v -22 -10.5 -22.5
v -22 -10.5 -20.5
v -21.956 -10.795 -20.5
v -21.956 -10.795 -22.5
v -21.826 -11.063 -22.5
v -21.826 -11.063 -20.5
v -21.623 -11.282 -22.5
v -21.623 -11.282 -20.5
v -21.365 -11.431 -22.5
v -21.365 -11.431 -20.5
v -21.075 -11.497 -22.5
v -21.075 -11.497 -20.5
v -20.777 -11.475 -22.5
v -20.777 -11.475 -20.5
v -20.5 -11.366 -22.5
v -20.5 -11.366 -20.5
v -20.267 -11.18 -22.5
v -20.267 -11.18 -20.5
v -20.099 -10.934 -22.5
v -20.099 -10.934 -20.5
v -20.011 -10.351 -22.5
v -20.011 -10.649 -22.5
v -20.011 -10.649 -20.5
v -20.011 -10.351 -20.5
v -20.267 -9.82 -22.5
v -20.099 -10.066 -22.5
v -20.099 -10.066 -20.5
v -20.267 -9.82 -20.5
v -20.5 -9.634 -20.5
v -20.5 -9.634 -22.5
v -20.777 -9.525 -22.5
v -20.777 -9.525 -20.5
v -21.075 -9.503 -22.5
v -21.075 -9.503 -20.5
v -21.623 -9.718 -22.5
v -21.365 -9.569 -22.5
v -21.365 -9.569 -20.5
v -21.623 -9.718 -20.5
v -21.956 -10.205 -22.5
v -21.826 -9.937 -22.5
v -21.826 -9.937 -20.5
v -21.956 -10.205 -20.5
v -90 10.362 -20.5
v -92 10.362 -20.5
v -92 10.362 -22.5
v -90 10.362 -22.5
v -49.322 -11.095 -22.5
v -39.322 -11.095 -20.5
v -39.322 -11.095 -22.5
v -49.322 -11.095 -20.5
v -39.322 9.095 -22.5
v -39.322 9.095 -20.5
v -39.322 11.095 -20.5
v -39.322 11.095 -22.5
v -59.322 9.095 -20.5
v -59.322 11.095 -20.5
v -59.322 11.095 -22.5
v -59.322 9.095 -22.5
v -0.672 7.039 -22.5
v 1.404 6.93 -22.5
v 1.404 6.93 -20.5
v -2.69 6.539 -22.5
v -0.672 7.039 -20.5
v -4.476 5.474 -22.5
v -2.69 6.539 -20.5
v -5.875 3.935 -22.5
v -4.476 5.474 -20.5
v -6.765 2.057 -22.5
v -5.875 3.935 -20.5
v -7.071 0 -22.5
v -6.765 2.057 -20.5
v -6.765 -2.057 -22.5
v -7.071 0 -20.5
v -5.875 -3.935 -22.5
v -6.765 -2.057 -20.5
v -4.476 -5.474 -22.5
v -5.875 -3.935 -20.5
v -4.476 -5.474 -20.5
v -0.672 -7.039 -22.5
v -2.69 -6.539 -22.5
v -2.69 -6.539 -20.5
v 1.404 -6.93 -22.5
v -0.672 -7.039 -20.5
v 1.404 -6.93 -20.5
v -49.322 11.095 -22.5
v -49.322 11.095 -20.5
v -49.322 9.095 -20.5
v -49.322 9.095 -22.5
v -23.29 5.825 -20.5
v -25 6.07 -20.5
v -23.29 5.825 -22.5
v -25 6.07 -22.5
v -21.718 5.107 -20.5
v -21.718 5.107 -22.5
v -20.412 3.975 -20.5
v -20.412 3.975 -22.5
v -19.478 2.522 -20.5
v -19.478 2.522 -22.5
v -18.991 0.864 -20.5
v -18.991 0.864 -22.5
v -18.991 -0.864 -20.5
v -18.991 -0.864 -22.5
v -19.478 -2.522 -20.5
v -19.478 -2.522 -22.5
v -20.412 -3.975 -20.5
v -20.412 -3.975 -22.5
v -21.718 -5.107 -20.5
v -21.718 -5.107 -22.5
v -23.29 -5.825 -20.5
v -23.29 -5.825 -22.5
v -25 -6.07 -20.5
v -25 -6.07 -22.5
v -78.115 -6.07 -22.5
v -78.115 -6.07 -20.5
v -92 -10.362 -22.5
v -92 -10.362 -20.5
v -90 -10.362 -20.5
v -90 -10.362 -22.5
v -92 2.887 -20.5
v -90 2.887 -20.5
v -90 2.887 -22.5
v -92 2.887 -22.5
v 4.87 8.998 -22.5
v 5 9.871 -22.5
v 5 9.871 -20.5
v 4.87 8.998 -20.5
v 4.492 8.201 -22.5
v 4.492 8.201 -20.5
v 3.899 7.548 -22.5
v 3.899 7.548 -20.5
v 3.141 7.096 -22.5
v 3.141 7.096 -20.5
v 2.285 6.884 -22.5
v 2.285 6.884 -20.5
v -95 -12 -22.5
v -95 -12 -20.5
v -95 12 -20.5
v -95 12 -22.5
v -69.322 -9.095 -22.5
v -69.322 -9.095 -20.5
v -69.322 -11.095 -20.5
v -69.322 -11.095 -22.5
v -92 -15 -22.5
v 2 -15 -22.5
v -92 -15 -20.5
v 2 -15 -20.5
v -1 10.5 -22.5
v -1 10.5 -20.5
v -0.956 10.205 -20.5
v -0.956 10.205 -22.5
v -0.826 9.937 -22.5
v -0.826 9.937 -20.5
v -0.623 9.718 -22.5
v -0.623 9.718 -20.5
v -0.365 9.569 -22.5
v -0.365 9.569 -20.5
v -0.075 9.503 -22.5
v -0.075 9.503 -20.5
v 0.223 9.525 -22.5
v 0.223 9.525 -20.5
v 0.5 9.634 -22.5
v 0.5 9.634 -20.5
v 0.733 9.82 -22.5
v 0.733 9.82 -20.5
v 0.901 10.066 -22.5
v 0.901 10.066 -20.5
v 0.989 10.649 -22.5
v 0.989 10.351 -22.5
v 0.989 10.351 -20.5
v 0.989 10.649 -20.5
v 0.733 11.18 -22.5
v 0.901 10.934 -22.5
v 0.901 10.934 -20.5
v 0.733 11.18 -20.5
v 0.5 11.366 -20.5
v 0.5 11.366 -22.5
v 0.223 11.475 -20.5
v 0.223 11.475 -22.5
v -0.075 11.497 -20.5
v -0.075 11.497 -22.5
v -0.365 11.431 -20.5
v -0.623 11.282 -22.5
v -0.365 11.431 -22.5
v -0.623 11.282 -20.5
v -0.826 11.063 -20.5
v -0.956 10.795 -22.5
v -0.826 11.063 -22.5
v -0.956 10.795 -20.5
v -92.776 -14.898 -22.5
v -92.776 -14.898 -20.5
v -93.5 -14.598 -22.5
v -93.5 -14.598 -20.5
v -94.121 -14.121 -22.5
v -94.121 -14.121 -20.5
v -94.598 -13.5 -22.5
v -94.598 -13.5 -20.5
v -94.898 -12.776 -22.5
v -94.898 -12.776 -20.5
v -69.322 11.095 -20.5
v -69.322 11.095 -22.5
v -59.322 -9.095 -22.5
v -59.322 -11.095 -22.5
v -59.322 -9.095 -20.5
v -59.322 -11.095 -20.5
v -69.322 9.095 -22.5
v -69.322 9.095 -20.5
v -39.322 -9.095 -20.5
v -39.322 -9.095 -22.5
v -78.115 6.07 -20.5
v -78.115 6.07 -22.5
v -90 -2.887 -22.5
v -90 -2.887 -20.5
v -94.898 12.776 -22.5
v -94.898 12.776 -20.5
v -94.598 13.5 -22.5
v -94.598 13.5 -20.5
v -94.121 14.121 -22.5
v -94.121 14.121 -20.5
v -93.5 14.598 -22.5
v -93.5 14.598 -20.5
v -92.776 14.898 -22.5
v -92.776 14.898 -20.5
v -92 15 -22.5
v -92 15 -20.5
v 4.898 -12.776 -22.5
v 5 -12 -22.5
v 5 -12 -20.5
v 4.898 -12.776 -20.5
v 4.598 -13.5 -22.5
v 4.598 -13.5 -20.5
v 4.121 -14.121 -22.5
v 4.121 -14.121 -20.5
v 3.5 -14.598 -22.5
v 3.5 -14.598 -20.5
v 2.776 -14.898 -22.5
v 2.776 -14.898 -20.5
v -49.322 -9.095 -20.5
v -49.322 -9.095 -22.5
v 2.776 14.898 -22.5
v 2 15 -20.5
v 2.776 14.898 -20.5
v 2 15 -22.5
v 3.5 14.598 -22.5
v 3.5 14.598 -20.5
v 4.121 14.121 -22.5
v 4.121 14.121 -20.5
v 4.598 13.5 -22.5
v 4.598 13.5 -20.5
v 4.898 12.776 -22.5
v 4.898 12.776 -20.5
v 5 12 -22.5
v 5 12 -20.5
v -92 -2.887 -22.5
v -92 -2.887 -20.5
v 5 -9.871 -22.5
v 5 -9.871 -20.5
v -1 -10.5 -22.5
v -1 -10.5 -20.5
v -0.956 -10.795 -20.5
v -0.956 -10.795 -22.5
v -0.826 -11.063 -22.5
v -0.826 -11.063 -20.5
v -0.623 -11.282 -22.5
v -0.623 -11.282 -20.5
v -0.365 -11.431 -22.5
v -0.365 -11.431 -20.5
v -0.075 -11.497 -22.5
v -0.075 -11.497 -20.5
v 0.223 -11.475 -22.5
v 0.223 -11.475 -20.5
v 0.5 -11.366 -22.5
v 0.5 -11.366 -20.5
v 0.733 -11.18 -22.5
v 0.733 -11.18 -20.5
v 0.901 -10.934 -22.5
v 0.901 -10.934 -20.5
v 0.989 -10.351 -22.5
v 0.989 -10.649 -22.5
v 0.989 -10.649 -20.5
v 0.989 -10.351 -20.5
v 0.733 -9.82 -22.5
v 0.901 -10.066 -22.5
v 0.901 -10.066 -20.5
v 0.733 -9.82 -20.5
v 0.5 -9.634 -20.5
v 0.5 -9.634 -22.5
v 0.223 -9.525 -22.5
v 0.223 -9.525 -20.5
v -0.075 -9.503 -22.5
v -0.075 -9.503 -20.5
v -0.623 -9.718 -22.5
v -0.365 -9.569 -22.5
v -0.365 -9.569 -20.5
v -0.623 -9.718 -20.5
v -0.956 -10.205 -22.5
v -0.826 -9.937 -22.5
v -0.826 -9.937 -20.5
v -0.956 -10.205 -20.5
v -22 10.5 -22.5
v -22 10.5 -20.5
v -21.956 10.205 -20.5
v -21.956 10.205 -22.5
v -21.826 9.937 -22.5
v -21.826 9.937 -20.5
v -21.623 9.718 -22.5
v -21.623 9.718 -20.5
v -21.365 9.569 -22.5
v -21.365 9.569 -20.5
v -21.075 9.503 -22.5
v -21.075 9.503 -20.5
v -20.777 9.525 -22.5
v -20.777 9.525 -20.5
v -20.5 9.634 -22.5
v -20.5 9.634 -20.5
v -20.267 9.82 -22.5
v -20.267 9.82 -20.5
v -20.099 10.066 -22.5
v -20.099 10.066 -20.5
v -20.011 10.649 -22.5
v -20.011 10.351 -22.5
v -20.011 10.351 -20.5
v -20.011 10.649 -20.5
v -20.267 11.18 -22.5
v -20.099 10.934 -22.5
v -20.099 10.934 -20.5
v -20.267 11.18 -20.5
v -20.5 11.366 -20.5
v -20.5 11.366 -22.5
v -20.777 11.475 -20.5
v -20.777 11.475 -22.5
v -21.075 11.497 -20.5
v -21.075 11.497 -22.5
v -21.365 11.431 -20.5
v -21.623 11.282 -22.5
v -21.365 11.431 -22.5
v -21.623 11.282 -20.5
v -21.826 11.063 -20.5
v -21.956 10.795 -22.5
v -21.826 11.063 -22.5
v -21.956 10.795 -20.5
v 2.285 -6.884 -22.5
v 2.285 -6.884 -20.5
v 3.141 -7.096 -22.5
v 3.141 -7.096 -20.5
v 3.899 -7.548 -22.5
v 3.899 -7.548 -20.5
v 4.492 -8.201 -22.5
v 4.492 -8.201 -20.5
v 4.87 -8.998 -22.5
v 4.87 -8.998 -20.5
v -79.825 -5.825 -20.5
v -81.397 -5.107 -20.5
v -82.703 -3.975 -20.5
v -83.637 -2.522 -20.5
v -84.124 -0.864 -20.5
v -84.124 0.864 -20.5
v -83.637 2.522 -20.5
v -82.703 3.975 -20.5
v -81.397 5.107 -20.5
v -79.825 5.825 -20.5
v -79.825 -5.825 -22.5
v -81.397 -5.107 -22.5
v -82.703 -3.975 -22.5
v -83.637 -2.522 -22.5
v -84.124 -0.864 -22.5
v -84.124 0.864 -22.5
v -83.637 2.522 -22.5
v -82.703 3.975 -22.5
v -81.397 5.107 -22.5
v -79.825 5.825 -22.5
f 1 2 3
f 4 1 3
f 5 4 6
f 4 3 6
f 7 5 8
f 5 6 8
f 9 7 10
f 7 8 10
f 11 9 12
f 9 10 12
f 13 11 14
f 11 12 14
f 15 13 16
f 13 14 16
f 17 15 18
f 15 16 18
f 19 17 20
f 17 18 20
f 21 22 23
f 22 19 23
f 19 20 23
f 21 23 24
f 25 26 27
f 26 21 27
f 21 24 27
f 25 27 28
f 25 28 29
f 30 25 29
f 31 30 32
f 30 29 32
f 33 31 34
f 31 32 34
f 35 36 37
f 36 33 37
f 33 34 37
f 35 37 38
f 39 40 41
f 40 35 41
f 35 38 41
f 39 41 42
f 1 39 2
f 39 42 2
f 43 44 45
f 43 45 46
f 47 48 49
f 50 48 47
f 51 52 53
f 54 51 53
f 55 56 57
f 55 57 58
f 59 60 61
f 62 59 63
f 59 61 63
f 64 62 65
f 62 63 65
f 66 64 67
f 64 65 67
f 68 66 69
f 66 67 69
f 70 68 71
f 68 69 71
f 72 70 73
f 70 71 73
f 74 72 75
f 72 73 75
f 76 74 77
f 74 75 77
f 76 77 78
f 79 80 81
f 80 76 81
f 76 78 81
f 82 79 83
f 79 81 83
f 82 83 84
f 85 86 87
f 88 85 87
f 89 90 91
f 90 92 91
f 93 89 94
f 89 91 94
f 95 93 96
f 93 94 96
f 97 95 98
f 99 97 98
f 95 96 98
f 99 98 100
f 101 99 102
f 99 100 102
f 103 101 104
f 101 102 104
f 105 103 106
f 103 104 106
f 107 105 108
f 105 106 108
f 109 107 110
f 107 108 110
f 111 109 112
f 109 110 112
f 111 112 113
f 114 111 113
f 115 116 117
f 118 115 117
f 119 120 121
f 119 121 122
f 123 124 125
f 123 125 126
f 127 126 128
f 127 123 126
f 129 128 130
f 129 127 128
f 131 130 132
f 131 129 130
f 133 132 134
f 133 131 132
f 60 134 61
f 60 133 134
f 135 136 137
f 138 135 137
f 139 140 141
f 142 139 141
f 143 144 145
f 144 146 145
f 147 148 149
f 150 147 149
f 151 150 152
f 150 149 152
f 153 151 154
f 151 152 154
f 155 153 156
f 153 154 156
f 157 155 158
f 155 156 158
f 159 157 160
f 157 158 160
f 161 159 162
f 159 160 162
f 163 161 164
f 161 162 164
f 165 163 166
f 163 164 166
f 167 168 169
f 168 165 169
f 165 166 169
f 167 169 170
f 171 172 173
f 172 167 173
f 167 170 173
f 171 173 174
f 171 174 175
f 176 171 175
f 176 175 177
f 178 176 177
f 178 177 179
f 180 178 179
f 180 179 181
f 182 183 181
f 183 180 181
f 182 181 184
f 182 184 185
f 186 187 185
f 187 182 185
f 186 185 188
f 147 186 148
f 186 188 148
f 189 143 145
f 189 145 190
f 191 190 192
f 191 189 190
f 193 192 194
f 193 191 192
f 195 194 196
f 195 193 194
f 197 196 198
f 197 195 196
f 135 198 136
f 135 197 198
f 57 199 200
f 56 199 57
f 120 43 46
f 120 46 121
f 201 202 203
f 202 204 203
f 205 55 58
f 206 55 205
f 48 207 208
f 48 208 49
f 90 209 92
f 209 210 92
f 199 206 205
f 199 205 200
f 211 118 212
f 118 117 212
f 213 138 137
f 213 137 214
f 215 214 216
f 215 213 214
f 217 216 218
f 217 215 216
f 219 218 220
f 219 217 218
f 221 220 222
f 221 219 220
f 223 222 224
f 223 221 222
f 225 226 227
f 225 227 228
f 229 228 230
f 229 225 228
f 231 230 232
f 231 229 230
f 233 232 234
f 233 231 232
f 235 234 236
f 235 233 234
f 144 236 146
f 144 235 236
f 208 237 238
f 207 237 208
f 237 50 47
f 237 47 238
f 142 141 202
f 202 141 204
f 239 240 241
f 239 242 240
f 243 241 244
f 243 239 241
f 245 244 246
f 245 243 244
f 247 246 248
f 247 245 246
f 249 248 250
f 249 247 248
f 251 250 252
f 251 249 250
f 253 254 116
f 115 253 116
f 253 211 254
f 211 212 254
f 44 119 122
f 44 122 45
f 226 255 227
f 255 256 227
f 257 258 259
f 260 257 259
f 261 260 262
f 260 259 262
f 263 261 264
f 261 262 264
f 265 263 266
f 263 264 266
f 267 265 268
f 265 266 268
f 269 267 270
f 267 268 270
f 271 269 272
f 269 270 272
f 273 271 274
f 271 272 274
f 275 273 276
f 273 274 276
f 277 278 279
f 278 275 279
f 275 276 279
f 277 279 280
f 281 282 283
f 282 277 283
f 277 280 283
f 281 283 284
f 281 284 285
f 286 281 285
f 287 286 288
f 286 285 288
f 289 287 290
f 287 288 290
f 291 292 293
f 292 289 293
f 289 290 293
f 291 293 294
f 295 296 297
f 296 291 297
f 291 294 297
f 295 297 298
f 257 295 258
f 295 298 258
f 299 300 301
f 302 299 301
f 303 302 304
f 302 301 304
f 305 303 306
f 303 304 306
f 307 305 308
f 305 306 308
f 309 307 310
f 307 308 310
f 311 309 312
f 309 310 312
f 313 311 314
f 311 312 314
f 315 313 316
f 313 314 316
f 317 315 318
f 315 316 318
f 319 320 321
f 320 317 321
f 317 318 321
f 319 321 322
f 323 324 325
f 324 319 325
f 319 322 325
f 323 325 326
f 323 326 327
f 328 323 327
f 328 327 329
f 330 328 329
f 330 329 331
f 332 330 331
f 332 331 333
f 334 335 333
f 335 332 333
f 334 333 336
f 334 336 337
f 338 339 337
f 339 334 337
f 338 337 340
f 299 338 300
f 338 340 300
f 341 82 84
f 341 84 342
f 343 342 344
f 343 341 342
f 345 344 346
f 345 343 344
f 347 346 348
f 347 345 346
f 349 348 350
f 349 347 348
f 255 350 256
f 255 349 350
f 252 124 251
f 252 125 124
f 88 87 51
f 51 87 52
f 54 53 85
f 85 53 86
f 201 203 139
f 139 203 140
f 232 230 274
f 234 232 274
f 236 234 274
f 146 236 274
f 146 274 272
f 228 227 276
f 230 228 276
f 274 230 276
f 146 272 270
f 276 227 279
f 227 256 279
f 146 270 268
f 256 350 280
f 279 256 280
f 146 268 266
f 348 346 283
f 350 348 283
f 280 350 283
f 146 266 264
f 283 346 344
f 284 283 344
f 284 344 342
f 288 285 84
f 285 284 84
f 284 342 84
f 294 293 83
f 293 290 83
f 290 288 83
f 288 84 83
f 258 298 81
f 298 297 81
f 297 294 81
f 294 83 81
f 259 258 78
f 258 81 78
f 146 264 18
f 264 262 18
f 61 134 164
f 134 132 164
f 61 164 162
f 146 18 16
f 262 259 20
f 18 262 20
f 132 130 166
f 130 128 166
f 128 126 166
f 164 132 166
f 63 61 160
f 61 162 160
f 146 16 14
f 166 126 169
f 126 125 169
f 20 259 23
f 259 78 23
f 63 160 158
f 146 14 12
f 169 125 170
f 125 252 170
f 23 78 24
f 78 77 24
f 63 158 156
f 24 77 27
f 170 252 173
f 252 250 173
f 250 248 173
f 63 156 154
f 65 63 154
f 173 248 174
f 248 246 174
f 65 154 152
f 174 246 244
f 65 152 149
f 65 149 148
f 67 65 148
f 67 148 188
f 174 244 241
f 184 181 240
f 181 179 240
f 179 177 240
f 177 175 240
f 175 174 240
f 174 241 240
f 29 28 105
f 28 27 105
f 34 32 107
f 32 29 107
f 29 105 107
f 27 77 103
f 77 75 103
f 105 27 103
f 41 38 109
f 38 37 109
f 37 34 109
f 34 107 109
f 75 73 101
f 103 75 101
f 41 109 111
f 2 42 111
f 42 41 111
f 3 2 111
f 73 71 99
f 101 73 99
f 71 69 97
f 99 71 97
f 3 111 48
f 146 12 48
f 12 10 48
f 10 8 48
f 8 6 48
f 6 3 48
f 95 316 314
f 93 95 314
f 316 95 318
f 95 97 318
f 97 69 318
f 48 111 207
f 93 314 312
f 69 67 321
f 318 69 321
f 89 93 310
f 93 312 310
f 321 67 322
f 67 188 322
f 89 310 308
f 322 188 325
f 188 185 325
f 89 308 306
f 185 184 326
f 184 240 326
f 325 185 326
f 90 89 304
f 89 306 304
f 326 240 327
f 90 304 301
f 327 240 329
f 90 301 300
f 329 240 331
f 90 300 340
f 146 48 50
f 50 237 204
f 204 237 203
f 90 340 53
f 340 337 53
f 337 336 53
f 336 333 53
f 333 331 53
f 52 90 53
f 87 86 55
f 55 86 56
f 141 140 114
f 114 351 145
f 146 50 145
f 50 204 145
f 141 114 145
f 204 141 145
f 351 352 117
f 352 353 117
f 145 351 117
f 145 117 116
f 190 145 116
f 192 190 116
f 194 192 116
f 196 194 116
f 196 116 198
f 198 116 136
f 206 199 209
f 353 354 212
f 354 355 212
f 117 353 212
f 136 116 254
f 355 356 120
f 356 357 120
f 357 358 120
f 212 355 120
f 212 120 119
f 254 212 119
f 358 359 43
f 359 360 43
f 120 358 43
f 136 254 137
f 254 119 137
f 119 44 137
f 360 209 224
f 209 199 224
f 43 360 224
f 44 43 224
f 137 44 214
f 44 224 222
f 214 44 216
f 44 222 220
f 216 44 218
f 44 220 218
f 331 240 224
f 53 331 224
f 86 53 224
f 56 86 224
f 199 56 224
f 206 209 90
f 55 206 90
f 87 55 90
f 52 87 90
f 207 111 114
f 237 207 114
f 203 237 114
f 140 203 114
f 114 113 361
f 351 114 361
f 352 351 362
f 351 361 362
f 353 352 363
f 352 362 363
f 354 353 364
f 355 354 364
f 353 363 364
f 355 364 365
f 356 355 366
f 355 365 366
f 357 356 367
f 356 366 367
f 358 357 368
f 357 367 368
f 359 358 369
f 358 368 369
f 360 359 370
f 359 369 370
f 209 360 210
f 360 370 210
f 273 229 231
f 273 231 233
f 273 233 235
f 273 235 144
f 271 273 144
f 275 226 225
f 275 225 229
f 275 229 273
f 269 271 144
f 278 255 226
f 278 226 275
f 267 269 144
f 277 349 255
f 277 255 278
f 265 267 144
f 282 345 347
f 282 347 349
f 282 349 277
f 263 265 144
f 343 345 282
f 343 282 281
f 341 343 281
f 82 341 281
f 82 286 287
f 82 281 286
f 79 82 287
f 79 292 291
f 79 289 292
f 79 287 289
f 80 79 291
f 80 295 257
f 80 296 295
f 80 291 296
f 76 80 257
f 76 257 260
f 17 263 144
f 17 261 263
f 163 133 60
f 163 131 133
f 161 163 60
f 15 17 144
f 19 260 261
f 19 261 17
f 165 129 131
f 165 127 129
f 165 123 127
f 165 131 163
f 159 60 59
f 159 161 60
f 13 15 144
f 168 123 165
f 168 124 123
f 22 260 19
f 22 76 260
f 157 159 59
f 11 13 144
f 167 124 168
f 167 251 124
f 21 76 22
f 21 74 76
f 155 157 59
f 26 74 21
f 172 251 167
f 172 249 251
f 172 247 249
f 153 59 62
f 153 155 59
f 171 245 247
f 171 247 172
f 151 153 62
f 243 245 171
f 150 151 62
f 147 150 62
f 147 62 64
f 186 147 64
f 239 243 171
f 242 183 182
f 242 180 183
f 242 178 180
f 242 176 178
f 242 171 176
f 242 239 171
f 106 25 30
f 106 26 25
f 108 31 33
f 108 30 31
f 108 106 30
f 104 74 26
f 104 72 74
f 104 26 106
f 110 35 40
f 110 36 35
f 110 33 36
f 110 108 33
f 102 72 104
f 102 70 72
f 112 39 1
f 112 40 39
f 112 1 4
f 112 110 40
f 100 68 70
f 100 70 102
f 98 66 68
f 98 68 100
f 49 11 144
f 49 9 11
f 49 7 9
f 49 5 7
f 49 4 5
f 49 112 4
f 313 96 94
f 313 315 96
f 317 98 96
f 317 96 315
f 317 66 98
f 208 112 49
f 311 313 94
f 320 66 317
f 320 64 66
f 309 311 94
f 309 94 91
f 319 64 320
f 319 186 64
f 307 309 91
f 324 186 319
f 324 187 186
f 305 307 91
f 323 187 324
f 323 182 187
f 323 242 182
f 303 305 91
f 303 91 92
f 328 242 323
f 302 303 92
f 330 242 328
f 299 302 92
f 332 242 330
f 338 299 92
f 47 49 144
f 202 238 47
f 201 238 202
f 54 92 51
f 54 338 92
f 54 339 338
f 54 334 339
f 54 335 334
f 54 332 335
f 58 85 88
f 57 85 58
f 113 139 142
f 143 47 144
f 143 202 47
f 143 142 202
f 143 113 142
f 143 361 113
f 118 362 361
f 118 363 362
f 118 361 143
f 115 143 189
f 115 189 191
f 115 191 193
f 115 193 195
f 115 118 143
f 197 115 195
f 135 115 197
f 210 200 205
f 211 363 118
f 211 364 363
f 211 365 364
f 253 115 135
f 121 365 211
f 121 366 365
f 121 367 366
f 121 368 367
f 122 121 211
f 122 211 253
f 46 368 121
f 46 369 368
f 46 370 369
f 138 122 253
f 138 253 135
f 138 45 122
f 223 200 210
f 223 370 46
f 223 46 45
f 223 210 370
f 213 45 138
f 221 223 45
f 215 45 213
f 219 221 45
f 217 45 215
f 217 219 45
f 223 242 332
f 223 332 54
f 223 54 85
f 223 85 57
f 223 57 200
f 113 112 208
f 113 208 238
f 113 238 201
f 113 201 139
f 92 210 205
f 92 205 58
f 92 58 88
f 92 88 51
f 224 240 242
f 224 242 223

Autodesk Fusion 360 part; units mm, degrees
sketch "Sketch1" plane through (0, 0, -20.5) normal (0, 0, -1) x (-1, 0, 0)
  line L0 (-5, 0) -> (-5, -15)
  line L1 (-5, -15) -> (95, -15)
  line L2 (95, -15) -> (95, 0)
  circle A0 centre (0, -10.5) radius 1
  circle A1 centre (21, -10.5) radius 1
  circle A2 centre (0, 0) radius 7.0711
  line L3 (92, -10.3624) -> (90, -10.3624)
  line L4 (90, -10.3624) -> (90, -2.8871)
  line L5 (90, -2.8871) -> (92, -2.8871)
  line L6 (92, -2.8871) -> (92, -10.3624)
  line L7 (100, 0) -> (42, 0) construction
  line L8 (-5, 15) -> (95, 15)
  line L9 (95, 15) -> (95, 0)
  line L10 (92, 10.3624) -> (90, 10.3624)
  line L11 (92, 2.8871) -> (92, 10.3624)
  line L12 (90, 10.3624) -> (90, 2.8871)
  line L13 (90, 2.8871) -> (92, 2.8871)
  circle A3 centre (21, 10.5) radius 1
  circle A4 centre (0, 10.5) radius 1
  line L14 (-5, 0) -> (-5, 15)
  line L15 (39.3215, 11.0949) -> (49.3215, 11.0949)
  line L16 (49.3215, 11.0949) -> (49.3215, 9.0949)
  line L17 (49.3215, 9.0949) -> (39.3215, 9.0949)
  line L18 (39.3215, 9.0949) -> (39.3215, 11.0949)
  line L19 (54.3215, 11.5) -> (54.3215, -12) construction
  line L20 (54.3215, -11.5) -> (54.3215, 12) construction
  line L21 (49.3215, -11.0949) -> (49.3215, -9.0949)
  line L22 (49.3215, -9.0949) -> (39.3215, -9.0949)
  line L23 (39.3215, -9.0949) -> (39.3215, -11.0949)
  line L24 (39.3215, -11.0949) -> (49.3215, -11.0949)
  line L25 (69.3215, 11.0949) -> (59.3215, 11.0949)
  line L26 (59.3215, 11.0949) -> (59.3215, 9.0949)
  line L27 (59.3215, 9.0949) -> (69.3215, 9.0949)
  line L28 (69.3215, 9.0949) -> (69.3215, 11.0949)
  line L29 (59.3215, -11.0949) -> (59.3215, -9.0949)
  line L30 (69.3215, -9.0949) -> (69.3215, -11.0949)
  line L31 (59.3215, -9.0949) -> (69.3215, -9.0949)
  line L32 (69.3215, -11.0949) -> (59.3215, -11.0949)
  dimension "d1" = 100
  dimension "d3" = 2
  dimension "d4" = 3
  dimension "d77" = 0
  dimension "d78" = 0
  dimension "d79" = 0
  dimension "d80" = 0
  dimension "d93" = 10
  dimension "d94" = 2
  dimension "d95" = 10
extrude "Extrude1" add sketch "Sketch1" along normal blind 2 contours L0 L1 L2 A2 L8 L9 L14
sketch "Sketch2" plane through (0, 0, -22.5) normal (0, 0, -1) x (-1, 0, 0)
  line L0 (25, -6.0704) -> (78.1149, -6.0704)
  arc A0 (78.1149, -6.0704) -> (78.1149, 6.0704) centre (78.1149, 0) ccw
  line L1 (78.1149, 6.0704) -> (25, 6.0704)
  arc A1 (25, 6.0704) -> (25, -6.0704) centre (25, 0) ccw
  line L2 (25, 0) -> (78.1149, 0) construction
extrude "Extrude2" cut sketch "Sketch2" against normal blind 2
fillet "Fillet1" radius 3 6 edges at (5, 15, -21.5) (5, 5, -21.5) (5, -5, -21.5) (5, -15, -21.5) (-95, 15, -21.5) (-95, -15, -21.5)
sketch "Sketch3" plane through (0, 0, -20.5) normal (0, 0, 1) x (1, 0, 0)
sketch "Projection" plane through (0, 0, -20.5) normal (0, 0, 1) x (1, 0, 0)
  line L0 (-25, -6.0704) -> (-78.1149, -6.0704)
  arc A0 (-78.1149, 6.0704) -> (-78.1149, -6.0704) centre (-78.1149, 0) ccw
  line L1 (-78.1149, 6.0704) -> (-25, 6.0704)
  arc A1 (-25, -6.0704) -> (-25, 6.0704) centre (-25, 0) ccw
  line L2 (-92, -2.8871) -> (-90, -2.8871)
  line L3 (-90, -2.8871) -> (-90, -10.3624)
  line L4 (-90, -10.3624) -> (-92, -10.3624)
  line L5 (-92, -10.3624) -> (-92, -2.8871)
  line L6 (-39.3215, -11.0949) -> (-49.3215, -11.0949)
  line L7 (-49.3215, -11.0949) -> (-49.3215, -9.0949)
  line L8 (-49.3215, -9.0949) -> (-39.3215, -9.0949)
  line L9 (-39.3215, -9.0949) -> (-39.3215, -11.0949)
  line L10 (-69.3215, 9.0949) -> (-69.3215, 11.0949)
  line L11 (-69.3215, 11.0949) -> (-59.3215, 11.0949)
  line L12 (-59.3215, 11.0949) -> (-59.3215, 9.0949)
  line L13 (-59.3215, 9.0949) -> (-69.3215, 9.0949)
  circle A2 centre (-21, -10.5) radius 1
  circle A3 centre (-21, 10.5) radius 1
  line L14 (-69.3215, -11.0949) -> (-69.3215, -9.0949)
  line L15 (-69.3215, -9.0949) -> (-59.3215, -9.0949)
  line L16 (-59.3215, -9.0949) -> (-59.3215, -11.0949)
  line L17 (-59.3215, -11.0949) -> (-69.3215, -11.0949)
  line L18 (-90, 2.8871) -> (-92, 2.8871)
  line L19 (-92, 2.8871) -> (-92, 10.3624)
  line L20 (-92, 10.3624) -> (-90, 10.3624)
  line L21 (-90, 10.3624) -> (-90, 2.8871)
  circle A4 centre (0, 10.5) radius 1
  line L22 (-39.3215, 9.0949) -> (-49.3215, 9.0949)
  line L23 (-49.3215, 9.0949) -> (-49.3215, 11.0949)
  line L24 (-49.3215, 11.0949) -> (-39.3215, 11.0949)
  line L25 (-39.3215, 11.0949) -> (-39.3215, 9.0949)
  circle A5 centre (0, -10.5) radius 1
  arc A6 (-95, -12) -> (-92, -15) centre (-92, -12) ccw
  line L26 (-92, -15) -> (2, -15)
  arc A7 (2, -15) -> (5, -12) centre (2, -12) ccw
  line L27 (5, -12) -> (5, -9.8705)
  arc A8 (5, -9.8705) -> (1.4042, -6.9302) centre (2, -9.8705) ccw
  arc A9 (1.4042, 6.9302) -> (1.4042, -6.9302) centre (0, 0) ccw
  arc A10 (1.4042, 6.9302) -> (5, 9.8705) centre (2, 9.8705) ccw
  line L28 (5, 9.8705) -> (5, 12)
  arc A11 (5, 12) -> (2, 15) centre (2, 12) ccw
  line L29 (2, 15) -> (-92, 15)
  arc A12 (-92, 15) -> (-95, 12) centre (-92, 12) ccw
  line L30 (-95, 12) -> (-95, -12)
equation "thiccness = 2 mm"
equation "d3 = thiccness"
equation "d11 = thiccness"
equation "d94 = thiccness"
equation "d96 = -thiccness"
